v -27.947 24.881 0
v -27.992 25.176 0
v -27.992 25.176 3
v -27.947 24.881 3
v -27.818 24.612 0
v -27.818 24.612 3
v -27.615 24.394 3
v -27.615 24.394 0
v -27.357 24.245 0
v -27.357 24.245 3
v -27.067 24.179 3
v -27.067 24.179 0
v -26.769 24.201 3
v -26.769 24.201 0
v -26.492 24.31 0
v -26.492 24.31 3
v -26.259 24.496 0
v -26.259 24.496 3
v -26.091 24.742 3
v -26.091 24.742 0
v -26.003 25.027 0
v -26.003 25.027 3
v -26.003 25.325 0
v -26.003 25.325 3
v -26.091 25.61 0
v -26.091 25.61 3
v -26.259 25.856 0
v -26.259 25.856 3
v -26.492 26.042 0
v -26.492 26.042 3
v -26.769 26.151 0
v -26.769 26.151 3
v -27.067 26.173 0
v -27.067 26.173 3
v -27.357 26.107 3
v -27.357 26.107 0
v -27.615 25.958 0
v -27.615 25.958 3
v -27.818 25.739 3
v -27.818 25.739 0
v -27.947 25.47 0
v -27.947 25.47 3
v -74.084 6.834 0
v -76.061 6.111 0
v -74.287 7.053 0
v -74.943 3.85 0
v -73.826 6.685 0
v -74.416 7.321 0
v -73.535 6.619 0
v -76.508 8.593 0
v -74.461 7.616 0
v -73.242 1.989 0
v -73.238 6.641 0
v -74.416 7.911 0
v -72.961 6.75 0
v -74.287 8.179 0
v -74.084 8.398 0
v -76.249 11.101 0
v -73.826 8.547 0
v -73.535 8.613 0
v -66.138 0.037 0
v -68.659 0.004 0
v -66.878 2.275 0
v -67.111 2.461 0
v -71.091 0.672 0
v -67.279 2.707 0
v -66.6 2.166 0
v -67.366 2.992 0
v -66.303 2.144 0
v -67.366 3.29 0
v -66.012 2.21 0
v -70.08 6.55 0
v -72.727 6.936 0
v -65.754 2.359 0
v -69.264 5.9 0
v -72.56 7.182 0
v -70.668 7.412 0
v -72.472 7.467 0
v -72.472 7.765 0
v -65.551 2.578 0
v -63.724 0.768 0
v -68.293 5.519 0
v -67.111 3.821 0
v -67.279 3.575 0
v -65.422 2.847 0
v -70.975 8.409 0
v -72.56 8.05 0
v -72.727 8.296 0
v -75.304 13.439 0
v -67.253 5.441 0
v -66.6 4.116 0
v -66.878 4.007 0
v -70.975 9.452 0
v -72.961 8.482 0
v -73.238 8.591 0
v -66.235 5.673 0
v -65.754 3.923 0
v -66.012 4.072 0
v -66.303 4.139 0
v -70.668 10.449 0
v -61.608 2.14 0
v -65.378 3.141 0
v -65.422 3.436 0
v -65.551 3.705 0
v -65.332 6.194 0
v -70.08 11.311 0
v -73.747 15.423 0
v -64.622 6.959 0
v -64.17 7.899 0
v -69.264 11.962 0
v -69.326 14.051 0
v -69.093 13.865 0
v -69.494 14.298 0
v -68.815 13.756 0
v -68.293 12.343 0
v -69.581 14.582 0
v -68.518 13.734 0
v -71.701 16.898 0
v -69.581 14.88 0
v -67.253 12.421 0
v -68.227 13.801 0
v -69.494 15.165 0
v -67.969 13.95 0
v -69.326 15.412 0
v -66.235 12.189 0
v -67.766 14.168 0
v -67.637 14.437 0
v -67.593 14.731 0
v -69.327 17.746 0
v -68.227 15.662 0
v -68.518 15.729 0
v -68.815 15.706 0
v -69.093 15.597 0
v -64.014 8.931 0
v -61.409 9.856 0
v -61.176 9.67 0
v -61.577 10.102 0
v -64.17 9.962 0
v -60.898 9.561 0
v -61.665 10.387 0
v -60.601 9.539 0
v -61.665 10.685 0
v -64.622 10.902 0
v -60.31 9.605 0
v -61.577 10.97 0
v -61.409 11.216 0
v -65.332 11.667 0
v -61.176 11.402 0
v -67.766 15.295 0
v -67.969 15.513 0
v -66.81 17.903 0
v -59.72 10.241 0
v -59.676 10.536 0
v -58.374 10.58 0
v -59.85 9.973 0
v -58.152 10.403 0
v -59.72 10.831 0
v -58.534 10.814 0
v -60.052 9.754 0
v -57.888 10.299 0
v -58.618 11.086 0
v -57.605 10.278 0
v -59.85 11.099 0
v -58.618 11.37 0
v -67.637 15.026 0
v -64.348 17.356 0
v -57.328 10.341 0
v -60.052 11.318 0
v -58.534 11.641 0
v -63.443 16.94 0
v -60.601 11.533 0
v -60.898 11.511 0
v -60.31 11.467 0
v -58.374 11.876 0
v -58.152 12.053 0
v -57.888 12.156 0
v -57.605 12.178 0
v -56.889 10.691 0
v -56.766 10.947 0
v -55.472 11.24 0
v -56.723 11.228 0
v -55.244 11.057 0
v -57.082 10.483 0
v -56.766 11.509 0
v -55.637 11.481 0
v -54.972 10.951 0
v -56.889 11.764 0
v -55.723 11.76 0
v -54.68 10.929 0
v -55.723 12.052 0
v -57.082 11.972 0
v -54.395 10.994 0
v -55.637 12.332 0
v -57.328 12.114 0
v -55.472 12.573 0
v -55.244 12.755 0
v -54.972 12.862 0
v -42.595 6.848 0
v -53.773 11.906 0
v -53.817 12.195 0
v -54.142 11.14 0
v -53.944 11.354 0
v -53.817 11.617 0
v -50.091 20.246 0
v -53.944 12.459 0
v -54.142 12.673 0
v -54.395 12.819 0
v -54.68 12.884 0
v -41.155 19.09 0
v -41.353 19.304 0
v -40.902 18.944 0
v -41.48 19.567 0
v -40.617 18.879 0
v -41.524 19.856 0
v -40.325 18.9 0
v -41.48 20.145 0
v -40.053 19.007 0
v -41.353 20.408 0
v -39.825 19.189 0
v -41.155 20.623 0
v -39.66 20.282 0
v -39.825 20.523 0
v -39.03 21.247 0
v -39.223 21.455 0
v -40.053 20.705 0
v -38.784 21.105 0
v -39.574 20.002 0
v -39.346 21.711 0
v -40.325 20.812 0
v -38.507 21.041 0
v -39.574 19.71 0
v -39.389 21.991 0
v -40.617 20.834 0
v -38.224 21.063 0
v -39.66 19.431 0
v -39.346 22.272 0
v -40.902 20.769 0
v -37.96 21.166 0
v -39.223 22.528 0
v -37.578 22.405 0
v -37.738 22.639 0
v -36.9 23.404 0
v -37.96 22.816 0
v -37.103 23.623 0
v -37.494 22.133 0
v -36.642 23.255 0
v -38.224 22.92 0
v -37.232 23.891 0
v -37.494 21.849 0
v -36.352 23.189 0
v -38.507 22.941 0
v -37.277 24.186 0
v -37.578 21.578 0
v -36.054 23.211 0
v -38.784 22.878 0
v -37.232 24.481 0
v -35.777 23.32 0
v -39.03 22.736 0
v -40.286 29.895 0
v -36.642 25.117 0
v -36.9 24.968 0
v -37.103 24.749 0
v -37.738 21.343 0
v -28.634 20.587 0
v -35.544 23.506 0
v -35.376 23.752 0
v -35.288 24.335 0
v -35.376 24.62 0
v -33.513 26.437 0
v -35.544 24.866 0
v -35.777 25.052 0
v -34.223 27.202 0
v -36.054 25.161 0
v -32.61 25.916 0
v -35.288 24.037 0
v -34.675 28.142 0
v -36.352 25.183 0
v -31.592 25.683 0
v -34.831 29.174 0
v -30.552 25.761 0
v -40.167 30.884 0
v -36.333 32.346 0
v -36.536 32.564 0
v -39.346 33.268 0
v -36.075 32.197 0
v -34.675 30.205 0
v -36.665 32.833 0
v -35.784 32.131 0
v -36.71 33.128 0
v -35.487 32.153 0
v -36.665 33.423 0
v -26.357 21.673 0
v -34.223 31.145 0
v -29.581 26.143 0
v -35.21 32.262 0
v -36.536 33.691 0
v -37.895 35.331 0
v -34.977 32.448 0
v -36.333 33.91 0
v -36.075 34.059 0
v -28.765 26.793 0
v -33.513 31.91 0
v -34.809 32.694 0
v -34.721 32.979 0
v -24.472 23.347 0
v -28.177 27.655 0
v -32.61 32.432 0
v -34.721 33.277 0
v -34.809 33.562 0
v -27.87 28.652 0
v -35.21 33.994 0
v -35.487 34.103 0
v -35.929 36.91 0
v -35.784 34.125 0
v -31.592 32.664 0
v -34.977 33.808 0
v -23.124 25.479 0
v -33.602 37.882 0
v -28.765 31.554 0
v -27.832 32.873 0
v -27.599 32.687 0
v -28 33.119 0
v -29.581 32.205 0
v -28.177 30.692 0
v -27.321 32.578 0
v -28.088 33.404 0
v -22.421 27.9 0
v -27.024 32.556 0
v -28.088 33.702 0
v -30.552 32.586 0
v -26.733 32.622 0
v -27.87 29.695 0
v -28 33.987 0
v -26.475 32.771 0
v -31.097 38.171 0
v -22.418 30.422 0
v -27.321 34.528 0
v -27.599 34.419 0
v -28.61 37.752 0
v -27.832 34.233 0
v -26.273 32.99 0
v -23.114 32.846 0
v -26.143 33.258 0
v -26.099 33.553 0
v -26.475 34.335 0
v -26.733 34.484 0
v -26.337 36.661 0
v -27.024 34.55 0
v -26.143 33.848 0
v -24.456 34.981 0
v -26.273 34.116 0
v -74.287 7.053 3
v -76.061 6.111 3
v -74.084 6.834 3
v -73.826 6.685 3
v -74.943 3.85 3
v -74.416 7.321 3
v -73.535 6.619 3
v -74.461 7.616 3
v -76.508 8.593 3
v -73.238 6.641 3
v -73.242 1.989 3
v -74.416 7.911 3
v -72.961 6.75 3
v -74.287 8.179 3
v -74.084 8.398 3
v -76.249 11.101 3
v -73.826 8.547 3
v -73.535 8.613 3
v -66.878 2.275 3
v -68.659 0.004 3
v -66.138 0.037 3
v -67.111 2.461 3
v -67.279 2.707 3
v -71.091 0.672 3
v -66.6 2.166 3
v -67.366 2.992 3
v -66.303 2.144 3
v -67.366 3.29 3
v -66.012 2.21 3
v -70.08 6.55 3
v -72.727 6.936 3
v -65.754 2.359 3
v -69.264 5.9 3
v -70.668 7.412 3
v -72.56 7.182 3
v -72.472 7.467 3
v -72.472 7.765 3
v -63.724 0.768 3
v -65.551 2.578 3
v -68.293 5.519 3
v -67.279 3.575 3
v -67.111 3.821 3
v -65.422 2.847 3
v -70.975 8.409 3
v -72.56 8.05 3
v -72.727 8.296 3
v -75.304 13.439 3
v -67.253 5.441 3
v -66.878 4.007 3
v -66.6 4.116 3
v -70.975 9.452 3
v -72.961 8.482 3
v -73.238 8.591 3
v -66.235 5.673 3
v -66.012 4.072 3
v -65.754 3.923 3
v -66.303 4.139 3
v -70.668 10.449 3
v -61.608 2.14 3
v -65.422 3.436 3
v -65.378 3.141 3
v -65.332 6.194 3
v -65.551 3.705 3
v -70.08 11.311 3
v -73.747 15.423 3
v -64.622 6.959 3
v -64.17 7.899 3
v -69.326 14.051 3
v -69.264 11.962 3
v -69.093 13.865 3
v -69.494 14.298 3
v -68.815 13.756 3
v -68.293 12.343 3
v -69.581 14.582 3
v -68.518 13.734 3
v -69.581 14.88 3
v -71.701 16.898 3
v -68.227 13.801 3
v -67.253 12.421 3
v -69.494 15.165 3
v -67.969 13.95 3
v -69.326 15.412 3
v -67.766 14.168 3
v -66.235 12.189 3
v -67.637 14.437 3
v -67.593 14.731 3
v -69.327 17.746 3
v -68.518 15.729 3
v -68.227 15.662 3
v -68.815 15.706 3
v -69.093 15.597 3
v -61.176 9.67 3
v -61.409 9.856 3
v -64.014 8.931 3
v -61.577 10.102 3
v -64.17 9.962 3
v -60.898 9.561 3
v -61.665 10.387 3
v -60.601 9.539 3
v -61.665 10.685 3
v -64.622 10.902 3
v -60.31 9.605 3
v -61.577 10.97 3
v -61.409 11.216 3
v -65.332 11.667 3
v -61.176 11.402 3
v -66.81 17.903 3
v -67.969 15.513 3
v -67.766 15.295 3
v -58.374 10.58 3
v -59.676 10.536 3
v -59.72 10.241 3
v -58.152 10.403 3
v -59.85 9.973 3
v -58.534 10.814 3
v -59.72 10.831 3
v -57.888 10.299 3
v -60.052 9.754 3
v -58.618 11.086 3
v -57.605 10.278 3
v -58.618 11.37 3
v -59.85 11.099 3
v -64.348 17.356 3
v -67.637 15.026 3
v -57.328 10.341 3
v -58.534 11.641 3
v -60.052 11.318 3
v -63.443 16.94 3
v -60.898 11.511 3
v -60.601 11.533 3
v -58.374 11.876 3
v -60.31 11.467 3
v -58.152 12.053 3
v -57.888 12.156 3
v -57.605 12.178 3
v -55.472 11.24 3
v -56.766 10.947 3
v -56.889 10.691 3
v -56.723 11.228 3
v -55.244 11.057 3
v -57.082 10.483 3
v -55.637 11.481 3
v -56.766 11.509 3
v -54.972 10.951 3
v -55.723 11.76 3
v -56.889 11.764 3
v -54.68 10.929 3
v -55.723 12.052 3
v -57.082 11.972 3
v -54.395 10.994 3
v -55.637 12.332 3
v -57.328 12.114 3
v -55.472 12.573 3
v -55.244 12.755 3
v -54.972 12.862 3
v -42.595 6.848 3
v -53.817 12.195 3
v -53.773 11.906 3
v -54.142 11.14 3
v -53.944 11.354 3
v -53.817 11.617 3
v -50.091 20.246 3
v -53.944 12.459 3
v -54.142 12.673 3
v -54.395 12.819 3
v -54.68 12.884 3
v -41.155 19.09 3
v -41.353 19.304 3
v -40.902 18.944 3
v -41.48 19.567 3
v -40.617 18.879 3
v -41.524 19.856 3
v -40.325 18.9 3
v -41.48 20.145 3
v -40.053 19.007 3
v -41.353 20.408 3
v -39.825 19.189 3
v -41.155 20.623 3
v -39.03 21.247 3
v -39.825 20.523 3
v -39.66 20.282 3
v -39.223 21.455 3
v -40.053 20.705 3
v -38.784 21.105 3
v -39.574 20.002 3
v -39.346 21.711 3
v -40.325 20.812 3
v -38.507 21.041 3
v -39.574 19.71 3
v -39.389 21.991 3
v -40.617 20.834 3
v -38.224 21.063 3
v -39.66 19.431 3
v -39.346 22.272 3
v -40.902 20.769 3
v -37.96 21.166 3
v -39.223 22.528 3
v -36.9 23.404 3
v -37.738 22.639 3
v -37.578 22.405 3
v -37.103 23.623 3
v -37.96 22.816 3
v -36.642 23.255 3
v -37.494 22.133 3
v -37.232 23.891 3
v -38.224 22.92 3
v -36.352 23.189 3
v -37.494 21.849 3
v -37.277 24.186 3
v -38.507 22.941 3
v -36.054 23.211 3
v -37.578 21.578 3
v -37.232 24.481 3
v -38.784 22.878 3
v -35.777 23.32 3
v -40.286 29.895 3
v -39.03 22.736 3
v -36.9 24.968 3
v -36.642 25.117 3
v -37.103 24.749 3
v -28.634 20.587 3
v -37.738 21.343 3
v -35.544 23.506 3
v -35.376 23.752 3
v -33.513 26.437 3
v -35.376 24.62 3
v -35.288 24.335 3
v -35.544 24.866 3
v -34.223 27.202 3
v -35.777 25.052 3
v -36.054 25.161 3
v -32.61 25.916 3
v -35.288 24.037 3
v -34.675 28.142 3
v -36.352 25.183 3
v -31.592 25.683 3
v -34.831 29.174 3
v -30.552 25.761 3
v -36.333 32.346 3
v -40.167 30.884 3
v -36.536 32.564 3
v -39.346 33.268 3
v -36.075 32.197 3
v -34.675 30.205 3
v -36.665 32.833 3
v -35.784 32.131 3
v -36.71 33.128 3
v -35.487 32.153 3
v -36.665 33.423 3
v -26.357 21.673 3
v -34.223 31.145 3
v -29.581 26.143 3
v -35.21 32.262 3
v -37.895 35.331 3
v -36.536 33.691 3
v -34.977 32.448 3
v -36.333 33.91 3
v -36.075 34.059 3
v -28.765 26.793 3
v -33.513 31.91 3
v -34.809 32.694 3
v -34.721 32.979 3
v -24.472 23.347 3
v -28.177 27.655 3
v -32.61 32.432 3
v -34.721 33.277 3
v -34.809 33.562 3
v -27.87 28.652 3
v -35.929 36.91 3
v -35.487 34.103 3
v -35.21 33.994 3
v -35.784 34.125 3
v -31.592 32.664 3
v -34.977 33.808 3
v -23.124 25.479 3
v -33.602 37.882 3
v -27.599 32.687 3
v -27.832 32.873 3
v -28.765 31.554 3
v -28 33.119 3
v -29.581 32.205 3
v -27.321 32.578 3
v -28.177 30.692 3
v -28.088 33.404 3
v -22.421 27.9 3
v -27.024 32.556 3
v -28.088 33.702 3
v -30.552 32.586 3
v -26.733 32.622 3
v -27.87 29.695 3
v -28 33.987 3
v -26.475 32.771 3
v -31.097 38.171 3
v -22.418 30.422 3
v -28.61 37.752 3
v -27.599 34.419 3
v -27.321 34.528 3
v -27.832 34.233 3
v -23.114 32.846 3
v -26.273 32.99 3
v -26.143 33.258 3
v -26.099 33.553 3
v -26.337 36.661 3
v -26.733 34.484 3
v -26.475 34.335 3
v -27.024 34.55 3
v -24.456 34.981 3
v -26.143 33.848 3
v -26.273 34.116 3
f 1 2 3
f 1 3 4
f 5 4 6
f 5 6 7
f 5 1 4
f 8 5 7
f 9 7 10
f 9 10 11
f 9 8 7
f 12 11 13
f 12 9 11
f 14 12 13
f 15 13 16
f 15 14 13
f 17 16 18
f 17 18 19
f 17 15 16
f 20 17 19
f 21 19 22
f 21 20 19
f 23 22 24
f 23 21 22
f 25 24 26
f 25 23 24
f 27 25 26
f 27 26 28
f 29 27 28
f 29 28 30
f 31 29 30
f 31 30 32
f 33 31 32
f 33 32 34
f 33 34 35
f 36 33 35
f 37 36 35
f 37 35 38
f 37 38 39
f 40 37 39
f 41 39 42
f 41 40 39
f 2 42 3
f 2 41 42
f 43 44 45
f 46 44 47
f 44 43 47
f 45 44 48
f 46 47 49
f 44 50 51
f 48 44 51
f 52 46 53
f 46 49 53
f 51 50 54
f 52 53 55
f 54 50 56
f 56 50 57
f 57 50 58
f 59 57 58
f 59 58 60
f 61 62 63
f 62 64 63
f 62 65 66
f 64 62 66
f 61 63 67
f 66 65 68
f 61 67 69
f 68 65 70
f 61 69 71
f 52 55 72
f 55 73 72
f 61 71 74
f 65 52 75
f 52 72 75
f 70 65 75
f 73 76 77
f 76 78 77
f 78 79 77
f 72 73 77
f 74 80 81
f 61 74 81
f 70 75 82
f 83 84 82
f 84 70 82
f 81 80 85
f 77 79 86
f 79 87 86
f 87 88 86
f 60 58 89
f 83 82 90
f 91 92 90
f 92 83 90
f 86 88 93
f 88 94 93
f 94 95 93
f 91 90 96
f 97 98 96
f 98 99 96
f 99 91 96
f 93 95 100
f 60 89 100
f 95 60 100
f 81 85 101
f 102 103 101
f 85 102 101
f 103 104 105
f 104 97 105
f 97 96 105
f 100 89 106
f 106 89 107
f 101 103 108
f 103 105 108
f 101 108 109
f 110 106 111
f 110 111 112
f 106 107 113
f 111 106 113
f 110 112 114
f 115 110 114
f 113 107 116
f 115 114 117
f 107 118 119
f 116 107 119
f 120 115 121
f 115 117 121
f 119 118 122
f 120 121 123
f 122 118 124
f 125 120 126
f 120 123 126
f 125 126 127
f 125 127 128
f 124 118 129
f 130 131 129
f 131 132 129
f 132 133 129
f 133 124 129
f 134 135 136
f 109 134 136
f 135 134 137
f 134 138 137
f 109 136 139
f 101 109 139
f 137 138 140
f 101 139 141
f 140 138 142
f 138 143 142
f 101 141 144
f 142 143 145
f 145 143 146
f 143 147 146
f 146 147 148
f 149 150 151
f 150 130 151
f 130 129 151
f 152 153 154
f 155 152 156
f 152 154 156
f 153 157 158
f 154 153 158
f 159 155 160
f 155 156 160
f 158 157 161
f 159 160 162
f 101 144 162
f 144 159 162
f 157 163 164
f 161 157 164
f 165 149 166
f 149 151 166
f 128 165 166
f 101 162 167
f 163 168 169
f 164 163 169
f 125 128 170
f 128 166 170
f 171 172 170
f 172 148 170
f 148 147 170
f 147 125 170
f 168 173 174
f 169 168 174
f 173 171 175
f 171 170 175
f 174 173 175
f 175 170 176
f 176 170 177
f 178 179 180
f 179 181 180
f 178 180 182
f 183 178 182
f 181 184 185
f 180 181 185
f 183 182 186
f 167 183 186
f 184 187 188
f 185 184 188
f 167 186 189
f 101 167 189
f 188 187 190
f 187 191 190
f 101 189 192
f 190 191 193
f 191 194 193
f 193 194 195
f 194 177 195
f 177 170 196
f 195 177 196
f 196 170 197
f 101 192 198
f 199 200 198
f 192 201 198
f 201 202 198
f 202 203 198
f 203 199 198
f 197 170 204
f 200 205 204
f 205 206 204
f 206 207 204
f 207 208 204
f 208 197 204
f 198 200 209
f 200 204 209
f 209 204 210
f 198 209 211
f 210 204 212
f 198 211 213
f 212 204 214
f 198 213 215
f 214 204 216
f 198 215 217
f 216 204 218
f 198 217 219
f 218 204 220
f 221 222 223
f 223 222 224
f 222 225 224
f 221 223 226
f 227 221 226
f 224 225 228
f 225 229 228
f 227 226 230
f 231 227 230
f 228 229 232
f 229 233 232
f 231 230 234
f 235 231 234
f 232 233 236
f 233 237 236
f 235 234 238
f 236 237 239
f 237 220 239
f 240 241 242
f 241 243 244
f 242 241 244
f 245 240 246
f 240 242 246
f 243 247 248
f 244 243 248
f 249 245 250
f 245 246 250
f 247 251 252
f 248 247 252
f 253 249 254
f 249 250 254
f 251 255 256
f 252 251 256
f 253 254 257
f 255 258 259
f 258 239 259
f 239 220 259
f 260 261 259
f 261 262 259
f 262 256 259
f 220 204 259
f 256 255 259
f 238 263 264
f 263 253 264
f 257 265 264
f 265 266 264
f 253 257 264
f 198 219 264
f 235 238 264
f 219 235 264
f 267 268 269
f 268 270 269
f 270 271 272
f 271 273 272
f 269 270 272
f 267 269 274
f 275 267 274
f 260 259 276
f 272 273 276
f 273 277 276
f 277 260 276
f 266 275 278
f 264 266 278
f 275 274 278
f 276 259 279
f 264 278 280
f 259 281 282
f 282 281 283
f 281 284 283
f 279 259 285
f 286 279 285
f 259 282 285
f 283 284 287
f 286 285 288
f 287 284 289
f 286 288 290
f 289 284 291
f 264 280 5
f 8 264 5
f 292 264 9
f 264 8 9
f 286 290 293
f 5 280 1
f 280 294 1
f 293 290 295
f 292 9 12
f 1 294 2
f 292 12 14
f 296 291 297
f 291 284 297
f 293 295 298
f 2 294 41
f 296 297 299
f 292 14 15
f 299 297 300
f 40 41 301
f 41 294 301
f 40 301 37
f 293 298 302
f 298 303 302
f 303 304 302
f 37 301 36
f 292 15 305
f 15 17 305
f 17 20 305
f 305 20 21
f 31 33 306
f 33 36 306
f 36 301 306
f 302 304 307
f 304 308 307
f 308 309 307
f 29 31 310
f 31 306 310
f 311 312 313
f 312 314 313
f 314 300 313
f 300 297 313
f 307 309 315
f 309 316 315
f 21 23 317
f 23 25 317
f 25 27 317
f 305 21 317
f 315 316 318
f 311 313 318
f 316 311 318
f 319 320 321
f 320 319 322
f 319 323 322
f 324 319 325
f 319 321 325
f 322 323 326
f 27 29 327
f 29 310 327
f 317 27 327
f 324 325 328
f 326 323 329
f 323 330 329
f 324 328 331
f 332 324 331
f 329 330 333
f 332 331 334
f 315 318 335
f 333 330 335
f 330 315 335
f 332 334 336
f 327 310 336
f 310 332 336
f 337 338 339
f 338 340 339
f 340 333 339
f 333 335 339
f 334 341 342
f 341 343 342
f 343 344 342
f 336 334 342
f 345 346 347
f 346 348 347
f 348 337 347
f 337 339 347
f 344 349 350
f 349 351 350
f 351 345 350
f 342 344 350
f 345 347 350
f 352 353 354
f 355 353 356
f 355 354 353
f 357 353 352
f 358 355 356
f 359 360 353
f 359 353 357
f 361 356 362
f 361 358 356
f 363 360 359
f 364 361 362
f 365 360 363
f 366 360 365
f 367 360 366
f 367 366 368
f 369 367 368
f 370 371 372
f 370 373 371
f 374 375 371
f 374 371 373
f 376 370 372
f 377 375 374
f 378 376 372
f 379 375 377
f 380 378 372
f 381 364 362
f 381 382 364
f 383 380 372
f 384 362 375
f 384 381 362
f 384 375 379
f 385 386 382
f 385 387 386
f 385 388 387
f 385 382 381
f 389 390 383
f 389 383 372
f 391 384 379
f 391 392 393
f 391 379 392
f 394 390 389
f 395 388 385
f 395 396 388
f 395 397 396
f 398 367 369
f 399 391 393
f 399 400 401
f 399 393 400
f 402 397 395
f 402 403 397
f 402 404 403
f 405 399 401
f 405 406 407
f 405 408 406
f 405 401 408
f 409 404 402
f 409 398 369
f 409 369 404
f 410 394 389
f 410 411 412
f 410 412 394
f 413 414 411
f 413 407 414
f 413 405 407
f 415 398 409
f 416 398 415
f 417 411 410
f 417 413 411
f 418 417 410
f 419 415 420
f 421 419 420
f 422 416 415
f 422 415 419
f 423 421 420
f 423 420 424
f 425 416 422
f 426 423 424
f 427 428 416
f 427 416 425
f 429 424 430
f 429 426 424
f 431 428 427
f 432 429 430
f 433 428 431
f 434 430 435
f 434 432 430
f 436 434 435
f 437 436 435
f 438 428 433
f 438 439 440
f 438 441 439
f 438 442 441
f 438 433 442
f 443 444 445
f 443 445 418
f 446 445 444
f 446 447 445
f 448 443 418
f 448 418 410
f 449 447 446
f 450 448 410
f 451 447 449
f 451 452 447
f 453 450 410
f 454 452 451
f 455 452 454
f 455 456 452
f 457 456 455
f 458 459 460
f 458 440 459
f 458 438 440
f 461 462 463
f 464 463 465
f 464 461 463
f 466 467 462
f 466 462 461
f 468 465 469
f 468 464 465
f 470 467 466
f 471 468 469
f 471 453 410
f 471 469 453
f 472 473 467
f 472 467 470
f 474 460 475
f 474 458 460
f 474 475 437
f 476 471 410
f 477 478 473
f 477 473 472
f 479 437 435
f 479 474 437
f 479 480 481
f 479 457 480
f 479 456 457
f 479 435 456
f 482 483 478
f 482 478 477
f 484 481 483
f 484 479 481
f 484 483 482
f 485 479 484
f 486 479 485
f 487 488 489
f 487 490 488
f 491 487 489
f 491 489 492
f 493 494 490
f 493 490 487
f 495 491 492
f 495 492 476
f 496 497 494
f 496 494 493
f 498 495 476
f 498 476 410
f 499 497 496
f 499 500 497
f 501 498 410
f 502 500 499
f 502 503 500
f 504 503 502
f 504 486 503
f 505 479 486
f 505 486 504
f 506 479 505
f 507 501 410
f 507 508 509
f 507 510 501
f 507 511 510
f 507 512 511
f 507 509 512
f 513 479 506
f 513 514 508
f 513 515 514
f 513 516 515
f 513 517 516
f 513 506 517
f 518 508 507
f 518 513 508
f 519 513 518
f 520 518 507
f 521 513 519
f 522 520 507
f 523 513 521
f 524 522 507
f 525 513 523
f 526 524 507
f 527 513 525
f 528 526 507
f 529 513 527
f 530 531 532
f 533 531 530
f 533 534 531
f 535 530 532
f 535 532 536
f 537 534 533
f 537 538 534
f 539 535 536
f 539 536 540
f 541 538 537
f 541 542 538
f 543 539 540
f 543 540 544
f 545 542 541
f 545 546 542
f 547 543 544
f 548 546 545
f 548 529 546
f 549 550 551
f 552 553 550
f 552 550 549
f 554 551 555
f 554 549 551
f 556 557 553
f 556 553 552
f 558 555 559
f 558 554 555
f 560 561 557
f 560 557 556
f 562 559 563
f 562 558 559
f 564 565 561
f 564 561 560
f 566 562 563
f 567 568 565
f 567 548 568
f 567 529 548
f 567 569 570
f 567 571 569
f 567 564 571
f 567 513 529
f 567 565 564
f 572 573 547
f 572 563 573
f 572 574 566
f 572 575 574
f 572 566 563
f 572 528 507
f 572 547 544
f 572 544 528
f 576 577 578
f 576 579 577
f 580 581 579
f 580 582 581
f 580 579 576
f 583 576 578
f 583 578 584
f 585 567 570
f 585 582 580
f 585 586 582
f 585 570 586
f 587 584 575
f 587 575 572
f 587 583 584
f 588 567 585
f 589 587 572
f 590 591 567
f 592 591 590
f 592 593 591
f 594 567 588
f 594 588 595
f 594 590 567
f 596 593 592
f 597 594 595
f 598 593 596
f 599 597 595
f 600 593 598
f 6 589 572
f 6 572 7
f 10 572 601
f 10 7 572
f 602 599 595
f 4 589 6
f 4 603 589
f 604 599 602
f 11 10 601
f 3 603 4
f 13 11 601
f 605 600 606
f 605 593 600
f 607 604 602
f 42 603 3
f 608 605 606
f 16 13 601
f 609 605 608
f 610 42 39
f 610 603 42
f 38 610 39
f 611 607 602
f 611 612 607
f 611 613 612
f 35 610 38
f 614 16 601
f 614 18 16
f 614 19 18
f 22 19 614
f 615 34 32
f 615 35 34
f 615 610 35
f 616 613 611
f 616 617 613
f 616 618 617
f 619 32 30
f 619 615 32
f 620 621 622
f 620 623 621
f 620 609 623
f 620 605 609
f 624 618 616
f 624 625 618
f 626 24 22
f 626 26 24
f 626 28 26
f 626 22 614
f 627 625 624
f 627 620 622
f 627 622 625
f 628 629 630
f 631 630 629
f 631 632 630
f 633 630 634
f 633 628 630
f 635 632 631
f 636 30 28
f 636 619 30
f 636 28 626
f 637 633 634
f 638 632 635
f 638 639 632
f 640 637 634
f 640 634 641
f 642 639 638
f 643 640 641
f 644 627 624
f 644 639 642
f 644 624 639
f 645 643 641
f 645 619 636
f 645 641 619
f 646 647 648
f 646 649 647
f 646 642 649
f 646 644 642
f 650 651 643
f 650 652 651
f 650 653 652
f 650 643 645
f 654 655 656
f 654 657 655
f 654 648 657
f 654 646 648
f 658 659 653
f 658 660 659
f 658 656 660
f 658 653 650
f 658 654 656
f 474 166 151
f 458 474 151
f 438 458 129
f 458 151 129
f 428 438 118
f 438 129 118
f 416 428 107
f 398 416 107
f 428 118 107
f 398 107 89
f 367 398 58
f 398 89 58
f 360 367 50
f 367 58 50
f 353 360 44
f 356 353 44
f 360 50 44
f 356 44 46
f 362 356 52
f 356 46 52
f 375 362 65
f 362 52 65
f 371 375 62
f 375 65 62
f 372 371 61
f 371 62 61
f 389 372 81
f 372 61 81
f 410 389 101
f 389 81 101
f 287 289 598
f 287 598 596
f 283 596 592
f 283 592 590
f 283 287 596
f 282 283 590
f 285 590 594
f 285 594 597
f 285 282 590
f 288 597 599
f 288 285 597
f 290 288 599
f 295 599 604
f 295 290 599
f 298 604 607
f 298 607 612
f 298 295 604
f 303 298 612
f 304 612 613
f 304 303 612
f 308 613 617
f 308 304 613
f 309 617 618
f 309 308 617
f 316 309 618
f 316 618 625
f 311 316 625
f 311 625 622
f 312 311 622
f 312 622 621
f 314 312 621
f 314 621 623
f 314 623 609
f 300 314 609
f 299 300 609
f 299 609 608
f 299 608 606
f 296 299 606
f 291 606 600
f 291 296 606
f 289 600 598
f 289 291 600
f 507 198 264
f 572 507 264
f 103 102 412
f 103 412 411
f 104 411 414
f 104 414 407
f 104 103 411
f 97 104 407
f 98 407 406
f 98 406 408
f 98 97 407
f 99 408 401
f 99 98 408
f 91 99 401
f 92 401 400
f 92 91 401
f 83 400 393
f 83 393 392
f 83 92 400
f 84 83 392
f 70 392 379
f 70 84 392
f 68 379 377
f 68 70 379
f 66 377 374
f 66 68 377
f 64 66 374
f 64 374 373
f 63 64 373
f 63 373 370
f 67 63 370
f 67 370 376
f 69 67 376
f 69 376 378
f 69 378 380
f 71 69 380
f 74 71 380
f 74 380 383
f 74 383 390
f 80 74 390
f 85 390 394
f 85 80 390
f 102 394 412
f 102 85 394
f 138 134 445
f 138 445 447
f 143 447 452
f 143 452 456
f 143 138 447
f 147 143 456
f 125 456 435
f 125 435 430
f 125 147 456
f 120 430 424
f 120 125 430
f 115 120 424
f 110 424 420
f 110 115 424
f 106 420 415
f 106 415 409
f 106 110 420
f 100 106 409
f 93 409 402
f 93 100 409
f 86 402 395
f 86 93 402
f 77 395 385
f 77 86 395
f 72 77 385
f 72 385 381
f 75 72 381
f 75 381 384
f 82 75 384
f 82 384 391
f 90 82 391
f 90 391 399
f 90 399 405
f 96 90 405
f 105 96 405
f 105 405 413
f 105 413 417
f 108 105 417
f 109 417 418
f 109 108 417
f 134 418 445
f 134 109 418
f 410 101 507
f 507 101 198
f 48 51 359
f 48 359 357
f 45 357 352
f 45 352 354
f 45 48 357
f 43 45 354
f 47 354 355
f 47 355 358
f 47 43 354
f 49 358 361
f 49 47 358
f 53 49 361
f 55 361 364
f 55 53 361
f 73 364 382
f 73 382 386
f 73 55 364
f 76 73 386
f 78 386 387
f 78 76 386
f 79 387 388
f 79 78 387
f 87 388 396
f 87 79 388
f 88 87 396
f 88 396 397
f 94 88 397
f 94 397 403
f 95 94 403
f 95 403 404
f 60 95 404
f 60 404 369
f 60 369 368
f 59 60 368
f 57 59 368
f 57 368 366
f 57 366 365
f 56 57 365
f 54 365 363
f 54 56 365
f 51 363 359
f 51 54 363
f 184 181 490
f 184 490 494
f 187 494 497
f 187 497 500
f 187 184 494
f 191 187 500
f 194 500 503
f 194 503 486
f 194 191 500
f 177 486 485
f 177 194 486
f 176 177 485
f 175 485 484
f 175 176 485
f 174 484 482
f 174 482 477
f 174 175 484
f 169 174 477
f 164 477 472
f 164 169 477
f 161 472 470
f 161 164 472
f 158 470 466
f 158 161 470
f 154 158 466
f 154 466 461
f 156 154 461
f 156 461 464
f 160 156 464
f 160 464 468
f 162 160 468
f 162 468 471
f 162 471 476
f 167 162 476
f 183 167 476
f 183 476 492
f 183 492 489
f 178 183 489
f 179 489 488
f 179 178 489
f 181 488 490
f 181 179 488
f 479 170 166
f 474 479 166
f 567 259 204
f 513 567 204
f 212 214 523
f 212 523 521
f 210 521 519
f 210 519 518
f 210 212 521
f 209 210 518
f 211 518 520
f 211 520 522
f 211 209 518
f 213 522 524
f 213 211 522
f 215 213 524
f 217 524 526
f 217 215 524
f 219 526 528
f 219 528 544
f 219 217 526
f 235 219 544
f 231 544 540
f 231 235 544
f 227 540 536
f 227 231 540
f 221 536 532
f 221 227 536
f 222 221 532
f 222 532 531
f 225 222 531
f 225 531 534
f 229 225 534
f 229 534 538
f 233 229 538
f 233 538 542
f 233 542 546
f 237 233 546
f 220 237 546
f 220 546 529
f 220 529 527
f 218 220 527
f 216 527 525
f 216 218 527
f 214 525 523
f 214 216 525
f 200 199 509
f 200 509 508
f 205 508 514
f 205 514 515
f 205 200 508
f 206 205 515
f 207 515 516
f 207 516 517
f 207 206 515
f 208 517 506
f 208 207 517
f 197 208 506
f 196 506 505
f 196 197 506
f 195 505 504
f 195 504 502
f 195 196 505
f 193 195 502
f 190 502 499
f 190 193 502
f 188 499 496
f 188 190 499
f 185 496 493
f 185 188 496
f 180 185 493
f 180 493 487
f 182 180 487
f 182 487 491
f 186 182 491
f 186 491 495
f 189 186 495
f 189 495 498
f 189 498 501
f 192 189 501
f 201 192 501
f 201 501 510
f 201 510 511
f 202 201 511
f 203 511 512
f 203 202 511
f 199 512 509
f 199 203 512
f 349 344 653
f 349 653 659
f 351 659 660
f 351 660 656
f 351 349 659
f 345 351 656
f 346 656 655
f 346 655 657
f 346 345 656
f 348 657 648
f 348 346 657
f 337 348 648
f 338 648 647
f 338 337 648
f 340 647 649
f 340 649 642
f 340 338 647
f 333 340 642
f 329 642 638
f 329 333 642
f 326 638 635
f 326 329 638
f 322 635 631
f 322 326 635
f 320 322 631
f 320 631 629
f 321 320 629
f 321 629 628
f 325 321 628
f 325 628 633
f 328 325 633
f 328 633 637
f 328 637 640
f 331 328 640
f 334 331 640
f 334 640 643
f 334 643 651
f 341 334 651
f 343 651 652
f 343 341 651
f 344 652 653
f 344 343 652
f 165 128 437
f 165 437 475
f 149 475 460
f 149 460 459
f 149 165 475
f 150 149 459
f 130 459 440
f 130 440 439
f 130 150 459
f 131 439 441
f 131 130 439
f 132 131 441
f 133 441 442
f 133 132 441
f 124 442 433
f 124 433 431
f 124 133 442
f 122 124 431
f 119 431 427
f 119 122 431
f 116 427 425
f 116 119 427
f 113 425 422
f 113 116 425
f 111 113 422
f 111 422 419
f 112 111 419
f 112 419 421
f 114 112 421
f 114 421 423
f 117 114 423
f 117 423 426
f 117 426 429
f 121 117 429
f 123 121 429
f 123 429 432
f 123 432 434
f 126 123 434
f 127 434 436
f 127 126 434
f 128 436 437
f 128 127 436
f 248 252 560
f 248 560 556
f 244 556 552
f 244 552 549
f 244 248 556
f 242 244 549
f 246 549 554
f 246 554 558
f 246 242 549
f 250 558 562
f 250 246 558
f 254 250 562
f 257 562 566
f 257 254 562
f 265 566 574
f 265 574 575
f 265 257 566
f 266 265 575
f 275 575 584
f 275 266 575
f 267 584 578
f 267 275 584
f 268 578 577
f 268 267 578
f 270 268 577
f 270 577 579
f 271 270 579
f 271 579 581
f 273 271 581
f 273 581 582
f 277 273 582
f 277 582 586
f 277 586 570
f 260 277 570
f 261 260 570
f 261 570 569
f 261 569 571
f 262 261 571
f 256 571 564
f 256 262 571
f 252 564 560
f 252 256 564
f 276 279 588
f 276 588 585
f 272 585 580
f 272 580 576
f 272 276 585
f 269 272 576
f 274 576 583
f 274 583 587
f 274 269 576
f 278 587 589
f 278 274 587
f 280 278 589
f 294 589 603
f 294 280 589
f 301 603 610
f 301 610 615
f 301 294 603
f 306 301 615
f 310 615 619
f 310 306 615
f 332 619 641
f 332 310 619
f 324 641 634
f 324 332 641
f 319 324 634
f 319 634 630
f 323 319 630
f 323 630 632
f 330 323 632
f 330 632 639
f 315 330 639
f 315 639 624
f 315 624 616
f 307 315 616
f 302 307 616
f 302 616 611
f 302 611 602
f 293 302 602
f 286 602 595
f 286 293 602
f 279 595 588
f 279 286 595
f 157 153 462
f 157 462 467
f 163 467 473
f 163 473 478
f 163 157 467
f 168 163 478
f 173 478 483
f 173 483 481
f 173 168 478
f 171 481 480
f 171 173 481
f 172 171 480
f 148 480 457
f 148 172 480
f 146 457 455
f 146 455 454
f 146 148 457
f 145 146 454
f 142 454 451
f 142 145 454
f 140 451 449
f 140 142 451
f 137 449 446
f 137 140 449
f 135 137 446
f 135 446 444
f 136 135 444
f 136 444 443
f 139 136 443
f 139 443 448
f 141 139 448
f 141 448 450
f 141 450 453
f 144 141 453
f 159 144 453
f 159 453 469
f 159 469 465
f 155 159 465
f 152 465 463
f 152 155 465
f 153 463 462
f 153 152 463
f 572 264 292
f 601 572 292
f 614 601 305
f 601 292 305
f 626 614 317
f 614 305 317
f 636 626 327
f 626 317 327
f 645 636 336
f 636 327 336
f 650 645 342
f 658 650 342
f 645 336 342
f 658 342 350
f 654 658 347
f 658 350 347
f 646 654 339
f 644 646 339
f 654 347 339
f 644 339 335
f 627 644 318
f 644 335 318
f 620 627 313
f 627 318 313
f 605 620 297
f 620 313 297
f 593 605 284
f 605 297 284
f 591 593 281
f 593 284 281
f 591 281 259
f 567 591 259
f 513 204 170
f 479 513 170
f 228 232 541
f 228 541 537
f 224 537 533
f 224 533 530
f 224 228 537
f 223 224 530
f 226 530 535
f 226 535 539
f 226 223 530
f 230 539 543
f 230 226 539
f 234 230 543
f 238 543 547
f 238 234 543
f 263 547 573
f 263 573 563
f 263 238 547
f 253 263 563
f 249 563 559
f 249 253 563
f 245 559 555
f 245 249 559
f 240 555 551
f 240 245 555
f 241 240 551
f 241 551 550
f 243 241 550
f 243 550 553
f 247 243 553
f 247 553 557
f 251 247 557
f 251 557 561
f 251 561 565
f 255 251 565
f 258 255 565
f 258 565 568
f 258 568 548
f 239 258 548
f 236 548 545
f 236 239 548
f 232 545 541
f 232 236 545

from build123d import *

# Parameters (mm, degrees)
SKETCH1_R       = 1
SKETCH1_R_2     = 3.5
SKETCH1_R_3     = 0.952573724
SKETCH1_R_4     = 0.980307261
EXTRUDE_6_DEPTH = 3


with BuildPart() as part:
    # Sketch1 → Бобышка-Вытянуть6 (new body)
    with BuildSketch(Plane.XY):
        with BuildLine():
            Line((-50.090575528, 20.246358773), (-63.443383911, 16.939772721))
            Line((-63.443383911, 16.939772721), (-64.348156071, 17.355557159))
            ThreePointArc((-64.348156071, 17.355557159), (-76.371742075, 7.335892912), (-61.608311767, 2.139604087))
            Line((-61.608311767, 2.139604087), (-42.594837437, 6.847953613))
            Line((-42.594837437, 6.847953613), (-28.633720832, 20.587239783))
            ThreePointArc((-28.633720832, 20.587239783), (-25.336971544, 35.887296519), (-40.166847554, 30.883790793))
            Line((-40.166847554, 30.883790793), (-40.285943738, 29.895203185))
            Line((-40.285943738, 29.895203185), (-50.090575528, 20.246358773))
        make_face()
        with Locations((-27.098820281, 33.552896146)):
            Circle(SKETCH1_R, mode=Mode.SUBTRACT)
        with Locations((-67.514190904, 8.930818383)):
            Circle(SKETCH1_R_2, mode=Mode.SUBTRACT)
        with Locations((-60.675780867, 10.535905116)):
            Circle(SKETCH1_R, mode=Mode.SUBTRACT)
        with Locations((-66.377650396, 3.14132137)):
            Circle(SKETCH1_R, mode=Mode.SUBTRACT)
        with Locations((-68.59259333, 14.731425956)):
            Circle(SKETCH1_R, mode=Mode.SUBTRACT)
        with Locations((-57.675780867, 11.227745586)):
            Circle(SKETCH1_R_3, mode=Mode.SUBTRACT)
        with Locations((-54.753543693, 11.906369118)):
            Circle(SKETCH1_R_4, mode=Mode.SUBTRACT)
        with Locations(Location((-40.543510307, 19.856172639, 0), (0, 0, 180))):
            Circle(SKETCH1_R_4, mode=Mode.SUBTRACT)
        with Locations(Location((-38.436147278, 21.991359062, 0), (0, 0, 180))):
            Circle(SKETCH1_R_3, mode=Mode.SUBTRACT)
        with Locations(Location((-35.709722432, 33.127748875, 0), (0, 0, 180))):
            Circle(SKETCH1_R, mode=Mode.SUBTRACT)
        with Locations(Location((-26.991820916, 25.175724624, 0), (0, 0, 180))):
            Circle(SKETCH1_R, mode=Mode.SUBTRACT)
        with Locations(Location((-36.27683183, 24.185897745, 0), (0, 0, 180))):
            Circle(SKETCH1_R, mode=Mode.SUBTRACT)
        with Locations(Location((-73.460528059, 7.615837609, 0), (0, 0, 180))):
            Circle(SKETCH1_R, mode=Mode.SUBTRACT)
        with Locations(Location((-31.330827271, 29.173602043, 0), (0, 0, 180))):
            Circle(SKETCH1_R_2, mode=Mode.SUBTRACT)
    extrude(amount=EXTRUDE_6_DEPTH)


solid = part.part
